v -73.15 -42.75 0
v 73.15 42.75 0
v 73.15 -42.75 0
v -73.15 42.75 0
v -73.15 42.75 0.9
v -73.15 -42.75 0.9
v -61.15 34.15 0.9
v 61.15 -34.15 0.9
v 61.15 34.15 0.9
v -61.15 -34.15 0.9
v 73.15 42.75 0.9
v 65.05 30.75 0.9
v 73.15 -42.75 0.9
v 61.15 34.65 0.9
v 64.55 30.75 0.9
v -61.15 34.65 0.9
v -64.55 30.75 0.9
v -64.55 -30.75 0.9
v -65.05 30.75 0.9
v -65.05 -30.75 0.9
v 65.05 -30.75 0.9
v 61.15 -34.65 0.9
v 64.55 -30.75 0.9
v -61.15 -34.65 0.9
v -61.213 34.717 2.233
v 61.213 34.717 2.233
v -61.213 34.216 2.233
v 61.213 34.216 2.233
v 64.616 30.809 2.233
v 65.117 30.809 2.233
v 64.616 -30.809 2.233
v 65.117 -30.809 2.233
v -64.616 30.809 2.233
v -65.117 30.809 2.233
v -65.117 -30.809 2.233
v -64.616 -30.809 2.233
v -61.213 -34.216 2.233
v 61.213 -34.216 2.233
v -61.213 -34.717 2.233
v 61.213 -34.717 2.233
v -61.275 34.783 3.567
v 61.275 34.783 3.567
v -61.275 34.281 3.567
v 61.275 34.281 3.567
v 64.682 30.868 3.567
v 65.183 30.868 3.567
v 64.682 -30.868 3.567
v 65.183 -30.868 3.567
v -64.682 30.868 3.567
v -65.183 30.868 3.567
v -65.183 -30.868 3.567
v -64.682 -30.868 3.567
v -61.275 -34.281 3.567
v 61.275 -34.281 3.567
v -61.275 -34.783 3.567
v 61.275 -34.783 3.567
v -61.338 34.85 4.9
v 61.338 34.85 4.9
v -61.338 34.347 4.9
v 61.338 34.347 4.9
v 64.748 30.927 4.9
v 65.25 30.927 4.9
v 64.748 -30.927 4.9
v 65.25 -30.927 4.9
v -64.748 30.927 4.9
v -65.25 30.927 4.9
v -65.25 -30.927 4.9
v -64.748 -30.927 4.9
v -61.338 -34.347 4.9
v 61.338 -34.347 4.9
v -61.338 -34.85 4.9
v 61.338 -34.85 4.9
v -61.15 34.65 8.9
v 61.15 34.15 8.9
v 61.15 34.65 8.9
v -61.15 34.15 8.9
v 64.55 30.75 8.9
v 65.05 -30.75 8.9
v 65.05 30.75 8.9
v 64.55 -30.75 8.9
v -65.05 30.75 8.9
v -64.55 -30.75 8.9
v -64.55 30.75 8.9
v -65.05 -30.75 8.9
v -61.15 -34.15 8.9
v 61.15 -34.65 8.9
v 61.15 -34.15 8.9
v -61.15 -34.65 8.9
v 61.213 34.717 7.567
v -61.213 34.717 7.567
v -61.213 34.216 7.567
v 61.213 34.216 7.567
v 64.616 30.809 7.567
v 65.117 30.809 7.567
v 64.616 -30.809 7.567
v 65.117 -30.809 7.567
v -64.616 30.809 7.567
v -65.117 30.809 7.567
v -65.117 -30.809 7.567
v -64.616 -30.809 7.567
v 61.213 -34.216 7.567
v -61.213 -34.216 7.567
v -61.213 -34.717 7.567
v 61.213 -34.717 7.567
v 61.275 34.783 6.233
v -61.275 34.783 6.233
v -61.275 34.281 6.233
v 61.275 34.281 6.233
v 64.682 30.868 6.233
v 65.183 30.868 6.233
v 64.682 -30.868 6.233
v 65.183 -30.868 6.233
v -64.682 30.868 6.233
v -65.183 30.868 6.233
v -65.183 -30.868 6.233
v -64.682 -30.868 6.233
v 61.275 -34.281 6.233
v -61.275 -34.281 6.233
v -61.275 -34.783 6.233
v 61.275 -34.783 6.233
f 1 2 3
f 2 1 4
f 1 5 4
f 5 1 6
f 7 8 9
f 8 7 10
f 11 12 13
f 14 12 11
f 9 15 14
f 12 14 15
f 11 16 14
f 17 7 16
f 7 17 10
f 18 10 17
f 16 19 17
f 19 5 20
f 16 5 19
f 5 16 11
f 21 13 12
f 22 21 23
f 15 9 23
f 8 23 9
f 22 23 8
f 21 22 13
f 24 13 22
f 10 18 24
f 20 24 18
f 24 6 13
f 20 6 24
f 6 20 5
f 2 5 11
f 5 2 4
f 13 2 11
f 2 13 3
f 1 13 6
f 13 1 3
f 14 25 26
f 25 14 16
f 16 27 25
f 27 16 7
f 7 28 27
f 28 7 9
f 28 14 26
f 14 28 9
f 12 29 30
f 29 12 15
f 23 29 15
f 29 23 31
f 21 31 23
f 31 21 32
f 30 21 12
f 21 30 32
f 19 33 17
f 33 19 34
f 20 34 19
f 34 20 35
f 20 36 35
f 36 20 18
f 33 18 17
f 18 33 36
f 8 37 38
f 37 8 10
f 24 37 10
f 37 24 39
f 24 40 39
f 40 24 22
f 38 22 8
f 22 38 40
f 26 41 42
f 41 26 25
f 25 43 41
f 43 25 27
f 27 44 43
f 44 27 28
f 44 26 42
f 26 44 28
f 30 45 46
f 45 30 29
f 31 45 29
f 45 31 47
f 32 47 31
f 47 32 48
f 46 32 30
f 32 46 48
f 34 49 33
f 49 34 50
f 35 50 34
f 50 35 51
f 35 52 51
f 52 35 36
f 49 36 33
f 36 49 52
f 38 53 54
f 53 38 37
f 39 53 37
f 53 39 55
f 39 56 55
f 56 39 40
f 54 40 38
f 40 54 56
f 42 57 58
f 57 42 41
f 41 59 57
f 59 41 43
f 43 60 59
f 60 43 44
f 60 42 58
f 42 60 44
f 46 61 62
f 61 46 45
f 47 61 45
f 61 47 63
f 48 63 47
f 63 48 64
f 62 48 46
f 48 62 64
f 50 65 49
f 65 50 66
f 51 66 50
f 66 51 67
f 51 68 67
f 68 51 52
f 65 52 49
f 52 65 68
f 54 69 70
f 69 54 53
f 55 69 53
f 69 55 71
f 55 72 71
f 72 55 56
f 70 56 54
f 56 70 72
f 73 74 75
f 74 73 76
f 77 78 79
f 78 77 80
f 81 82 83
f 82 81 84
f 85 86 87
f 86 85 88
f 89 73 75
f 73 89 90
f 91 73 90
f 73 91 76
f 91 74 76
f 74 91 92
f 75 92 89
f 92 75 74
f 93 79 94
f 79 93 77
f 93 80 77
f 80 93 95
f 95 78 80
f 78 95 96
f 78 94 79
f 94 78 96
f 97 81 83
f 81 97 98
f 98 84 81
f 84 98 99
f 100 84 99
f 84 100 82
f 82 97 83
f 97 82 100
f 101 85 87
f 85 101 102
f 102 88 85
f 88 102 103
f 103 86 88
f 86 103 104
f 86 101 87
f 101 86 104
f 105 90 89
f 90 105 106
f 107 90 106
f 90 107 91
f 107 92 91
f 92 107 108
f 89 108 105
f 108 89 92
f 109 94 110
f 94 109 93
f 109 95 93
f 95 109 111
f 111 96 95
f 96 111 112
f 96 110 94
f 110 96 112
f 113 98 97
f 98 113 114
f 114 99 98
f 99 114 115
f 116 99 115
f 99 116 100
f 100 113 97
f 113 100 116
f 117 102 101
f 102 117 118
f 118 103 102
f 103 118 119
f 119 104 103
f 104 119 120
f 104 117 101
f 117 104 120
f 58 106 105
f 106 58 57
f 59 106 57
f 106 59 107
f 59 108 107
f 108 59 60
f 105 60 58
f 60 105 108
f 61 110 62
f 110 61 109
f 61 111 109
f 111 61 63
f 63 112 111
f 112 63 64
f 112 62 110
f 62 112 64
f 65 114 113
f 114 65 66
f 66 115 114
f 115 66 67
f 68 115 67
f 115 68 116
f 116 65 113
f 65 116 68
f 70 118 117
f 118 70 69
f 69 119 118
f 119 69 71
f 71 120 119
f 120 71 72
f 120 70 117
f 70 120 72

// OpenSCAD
// Print settings that this model is designed for
layer_height    = 0.25;
extrusion_width = 0.45;

size = [130.3, 69.5];

material_xy = layer_height * 4;
material_z  = extrusion_width * 2;

overhang = 8.0;


back_cover();


module back_cover() {
    base();

    translate([0, 0, material_z])
    half_holders();

    translate([0, 0, material_z + overhang])
    mirror([0, 0, 1])
    half_holders();

    module base() {
        linear_extrude(material_z)
        square(size = size + 2 * [overhang, overhang], center = true);
    }

    module half_holders() {
        interference = [0.2, 0.2];

        size_inner = size - interference;
        size_outer = size + interference;

        scale = [
            size_outer[0] / size_inner[0],
            size_outer[1] / size_inner[1],
        ];

        linear_extrude(height = overhang / 2, scale = scale)
        difference() {
            square(size = size_inner, center = true);
            square(
                size = size_inner - [material_xy, material_xy],
                center = true
            );

            corners = [
                [-size[0], -size[1]],
                [-size[0],  size[1]],
                [ size[0], -size[1]],
                [ size[0],  size[1]],
            ];
            for (corner = corners) {
                translate(corner / 2)
                square([overhang, overhang], center = true);
            }
        }
    }
}
